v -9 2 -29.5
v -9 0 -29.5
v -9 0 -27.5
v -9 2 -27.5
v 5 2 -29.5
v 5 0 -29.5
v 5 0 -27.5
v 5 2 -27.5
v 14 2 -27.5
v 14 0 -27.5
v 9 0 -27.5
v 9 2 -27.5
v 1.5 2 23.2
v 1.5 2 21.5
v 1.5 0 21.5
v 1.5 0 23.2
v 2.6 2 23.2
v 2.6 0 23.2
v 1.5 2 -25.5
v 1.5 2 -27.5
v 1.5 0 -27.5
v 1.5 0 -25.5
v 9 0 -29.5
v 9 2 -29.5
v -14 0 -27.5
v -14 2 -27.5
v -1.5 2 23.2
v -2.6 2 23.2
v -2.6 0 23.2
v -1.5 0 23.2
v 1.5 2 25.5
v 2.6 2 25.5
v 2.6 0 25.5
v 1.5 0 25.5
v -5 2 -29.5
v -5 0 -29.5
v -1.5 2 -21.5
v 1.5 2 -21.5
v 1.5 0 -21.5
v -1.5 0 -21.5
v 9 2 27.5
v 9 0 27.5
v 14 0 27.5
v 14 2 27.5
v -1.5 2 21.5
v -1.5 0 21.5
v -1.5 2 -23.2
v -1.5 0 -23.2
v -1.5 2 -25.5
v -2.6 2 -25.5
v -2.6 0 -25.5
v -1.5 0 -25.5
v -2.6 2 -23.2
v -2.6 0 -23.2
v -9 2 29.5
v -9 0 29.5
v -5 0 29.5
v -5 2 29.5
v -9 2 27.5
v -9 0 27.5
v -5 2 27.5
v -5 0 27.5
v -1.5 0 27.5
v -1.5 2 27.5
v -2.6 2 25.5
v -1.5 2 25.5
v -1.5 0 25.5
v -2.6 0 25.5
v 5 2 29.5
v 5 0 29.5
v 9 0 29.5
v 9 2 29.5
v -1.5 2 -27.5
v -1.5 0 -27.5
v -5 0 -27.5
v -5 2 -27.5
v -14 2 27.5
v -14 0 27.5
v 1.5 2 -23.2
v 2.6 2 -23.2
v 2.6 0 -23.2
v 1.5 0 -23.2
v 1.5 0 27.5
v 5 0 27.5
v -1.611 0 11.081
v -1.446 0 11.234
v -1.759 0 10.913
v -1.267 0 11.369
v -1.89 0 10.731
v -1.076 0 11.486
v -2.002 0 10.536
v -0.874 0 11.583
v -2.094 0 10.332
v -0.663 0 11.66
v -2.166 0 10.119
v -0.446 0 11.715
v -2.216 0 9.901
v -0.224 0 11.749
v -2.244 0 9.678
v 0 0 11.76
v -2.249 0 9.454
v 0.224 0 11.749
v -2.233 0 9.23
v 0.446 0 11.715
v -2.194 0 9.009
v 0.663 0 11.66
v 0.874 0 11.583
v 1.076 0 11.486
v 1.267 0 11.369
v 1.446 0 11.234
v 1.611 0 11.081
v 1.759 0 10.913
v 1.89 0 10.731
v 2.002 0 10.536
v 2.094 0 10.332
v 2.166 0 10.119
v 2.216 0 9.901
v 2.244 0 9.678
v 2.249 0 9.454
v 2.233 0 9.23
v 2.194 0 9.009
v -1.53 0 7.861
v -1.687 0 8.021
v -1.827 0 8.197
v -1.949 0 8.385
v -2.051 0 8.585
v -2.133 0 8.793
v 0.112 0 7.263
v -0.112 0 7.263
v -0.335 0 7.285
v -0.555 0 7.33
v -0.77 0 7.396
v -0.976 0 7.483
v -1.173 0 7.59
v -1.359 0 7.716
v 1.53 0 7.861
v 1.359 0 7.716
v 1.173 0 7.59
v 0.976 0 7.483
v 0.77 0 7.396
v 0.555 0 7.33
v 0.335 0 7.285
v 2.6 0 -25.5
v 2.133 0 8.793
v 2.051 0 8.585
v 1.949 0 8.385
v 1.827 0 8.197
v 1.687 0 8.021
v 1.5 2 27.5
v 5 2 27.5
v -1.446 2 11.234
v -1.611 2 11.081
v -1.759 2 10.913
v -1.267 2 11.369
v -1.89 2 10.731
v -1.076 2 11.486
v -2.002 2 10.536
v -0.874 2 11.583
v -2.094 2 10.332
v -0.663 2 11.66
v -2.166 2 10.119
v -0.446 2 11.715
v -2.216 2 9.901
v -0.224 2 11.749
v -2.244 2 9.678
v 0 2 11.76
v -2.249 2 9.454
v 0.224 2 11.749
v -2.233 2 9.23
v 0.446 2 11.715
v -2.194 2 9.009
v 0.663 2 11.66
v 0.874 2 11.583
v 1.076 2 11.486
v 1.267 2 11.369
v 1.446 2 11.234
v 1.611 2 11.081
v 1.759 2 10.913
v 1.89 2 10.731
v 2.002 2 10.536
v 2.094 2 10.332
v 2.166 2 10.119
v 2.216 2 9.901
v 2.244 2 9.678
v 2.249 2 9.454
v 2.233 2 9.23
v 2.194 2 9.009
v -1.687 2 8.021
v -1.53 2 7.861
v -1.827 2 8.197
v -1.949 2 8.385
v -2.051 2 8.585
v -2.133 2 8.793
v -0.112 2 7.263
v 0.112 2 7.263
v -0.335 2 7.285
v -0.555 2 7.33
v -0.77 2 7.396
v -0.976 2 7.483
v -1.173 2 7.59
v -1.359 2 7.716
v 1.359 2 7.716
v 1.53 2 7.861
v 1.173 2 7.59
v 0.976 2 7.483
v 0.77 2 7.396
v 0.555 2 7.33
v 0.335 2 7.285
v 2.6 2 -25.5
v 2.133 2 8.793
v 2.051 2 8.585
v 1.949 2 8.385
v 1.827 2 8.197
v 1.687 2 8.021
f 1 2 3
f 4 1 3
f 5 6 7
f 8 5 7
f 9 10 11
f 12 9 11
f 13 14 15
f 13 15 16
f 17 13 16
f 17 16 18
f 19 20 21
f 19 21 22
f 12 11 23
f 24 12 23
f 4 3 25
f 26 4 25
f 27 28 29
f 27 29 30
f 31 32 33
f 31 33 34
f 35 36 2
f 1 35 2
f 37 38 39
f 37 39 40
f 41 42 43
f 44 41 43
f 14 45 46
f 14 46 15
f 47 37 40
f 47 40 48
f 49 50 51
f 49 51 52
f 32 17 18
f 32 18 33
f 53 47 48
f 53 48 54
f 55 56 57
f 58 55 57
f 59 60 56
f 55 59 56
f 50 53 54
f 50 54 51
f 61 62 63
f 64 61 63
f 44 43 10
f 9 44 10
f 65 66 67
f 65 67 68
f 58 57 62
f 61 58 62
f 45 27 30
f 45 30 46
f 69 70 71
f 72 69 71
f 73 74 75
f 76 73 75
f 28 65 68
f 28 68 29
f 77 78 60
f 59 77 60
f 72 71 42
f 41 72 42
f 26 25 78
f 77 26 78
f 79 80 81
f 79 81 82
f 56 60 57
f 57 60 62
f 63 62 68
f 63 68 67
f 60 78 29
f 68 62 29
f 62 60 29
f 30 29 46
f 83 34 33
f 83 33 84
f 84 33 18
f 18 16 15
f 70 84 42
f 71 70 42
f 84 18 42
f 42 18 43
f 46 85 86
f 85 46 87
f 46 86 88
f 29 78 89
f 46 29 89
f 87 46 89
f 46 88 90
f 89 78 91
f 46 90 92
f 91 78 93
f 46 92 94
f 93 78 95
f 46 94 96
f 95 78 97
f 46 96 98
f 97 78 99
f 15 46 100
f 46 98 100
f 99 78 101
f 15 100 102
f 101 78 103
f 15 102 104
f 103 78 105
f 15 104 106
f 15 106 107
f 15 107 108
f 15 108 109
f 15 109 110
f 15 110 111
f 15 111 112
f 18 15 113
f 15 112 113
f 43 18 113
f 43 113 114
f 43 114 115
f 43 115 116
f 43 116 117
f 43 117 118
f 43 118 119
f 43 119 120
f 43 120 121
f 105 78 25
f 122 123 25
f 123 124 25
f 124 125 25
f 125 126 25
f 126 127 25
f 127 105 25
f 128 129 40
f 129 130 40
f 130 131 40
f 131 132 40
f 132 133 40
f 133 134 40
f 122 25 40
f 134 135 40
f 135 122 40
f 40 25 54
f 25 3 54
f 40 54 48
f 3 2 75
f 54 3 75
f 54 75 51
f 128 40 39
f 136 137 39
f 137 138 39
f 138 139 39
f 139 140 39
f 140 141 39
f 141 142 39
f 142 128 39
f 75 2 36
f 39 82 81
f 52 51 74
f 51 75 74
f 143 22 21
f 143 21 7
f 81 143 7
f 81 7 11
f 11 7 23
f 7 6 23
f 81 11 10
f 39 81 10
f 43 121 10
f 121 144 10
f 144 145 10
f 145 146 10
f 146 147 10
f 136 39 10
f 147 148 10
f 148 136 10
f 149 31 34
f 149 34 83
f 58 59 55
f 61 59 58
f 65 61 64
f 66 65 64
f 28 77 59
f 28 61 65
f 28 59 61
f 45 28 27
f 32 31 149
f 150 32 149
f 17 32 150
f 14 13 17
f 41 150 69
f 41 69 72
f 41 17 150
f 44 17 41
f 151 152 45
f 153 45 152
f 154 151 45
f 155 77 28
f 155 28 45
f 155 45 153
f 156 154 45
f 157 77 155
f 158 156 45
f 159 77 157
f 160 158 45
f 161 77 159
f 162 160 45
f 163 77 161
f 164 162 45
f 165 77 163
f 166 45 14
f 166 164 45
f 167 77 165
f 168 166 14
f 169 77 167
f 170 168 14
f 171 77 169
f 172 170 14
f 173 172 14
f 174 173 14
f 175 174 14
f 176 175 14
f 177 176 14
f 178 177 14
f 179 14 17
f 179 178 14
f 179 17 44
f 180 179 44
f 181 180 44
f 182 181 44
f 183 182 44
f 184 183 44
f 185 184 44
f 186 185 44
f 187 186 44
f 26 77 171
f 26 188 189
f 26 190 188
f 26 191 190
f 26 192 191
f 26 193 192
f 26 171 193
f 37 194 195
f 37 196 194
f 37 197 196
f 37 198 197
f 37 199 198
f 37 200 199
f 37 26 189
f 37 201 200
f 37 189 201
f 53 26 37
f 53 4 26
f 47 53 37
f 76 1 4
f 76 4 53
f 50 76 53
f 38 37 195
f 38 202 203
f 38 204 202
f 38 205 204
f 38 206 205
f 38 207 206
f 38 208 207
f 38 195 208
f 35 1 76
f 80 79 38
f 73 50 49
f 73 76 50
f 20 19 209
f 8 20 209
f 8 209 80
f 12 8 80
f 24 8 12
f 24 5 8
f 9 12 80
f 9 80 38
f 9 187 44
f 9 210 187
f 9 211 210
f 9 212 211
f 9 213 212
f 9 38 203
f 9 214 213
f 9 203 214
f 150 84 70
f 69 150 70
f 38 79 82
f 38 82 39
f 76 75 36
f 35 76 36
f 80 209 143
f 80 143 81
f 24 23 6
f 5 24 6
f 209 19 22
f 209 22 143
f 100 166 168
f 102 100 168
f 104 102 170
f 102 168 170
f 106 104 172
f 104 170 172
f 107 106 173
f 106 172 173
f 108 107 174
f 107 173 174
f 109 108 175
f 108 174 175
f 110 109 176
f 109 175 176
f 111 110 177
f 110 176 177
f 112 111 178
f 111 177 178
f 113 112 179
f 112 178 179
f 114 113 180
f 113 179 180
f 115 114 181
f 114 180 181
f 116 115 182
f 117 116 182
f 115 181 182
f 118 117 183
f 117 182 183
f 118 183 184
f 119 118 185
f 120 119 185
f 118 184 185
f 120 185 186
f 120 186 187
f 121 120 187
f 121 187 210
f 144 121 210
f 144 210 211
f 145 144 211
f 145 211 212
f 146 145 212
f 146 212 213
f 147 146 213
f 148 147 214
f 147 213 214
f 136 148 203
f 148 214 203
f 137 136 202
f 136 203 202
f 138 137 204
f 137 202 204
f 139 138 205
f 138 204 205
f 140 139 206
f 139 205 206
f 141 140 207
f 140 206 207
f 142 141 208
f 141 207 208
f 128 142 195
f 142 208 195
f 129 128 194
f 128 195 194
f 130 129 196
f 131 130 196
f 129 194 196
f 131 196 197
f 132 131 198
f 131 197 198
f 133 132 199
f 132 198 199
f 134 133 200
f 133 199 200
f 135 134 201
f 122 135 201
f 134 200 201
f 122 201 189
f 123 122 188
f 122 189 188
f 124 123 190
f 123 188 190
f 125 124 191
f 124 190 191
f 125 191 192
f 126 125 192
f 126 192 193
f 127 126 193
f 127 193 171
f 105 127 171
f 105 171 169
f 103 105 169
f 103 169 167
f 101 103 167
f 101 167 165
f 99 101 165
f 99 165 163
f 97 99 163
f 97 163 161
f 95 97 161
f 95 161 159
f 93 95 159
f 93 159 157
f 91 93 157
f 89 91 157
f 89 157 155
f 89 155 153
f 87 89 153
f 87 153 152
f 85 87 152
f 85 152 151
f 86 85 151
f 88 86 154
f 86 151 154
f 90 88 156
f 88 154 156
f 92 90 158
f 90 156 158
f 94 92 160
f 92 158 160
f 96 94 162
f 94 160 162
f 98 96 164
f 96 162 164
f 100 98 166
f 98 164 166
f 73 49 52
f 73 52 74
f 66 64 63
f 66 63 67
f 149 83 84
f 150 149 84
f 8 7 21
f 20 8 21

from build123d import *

# Parameters (mm, degrees)
BOSS_EXTRUDE1_DEPTH = 2
CUT_EXTRUDE2_DEPTH  = 2
SKETCH5_R           = 2.25
CUT_EXTRUDE4_DEPTH  = 2


with BuildPart() as part:
    # Sketch1 → Boss-Extrude1 (new body)
    with BuildSketch(Plane(origin=(0, 0, 0), x_dir=(1, 0, 0), z_dir=(0, 1, 0))):
        Polygon((-14, -27.5), (-9, -27.5), (-9, -29.5), (-5, -29.5), (-5, -27.5), (5, -27.5), (5, -29.5), (9, -29.5), (9, -27.5), (14, -27.5), (14, 27.5), (9, 27.5), (9, 29.5), (5, 29.5), (5, 27.5), (-5, 27.5), (-5, 29.5), (-9, 29.5), (-9, 27.5), (-14, 27.5), (-14, 14.5), (-14, -14.5), align=None)
    extrude(amount=BOSS_EXTRUDE1_DEPTH)

    # Sketch4 → Cut-Extrude2 (cut)
    with BuildSketch(Plane(origin=(0, 2, 0), x_dir=(1, 0, 0), z_dir=(0, 1, 0))):
        Polygon((-1.5, 23.2), (-2.6, 23.2), (-2.6, 25.5), (-1.5, 25.5), (-1.5, 27.5), (1.5, 27.5), (1.5, 25.5), (2.6, 25.5), (2.6, 23.2), (1.5, 23.2), (1.5, 21.5), (-1.5, 21.5), align=None)
        Polygon((1.5, -25.5), (1.5, -27.5), (-1.5, -27.5), (-1.5, -25.5), (-2.6, -25.5), (-2.6, -23.2), (-1.5, -23.2), (-1.5, -21.5), (1.5, -21.5), (1.5, -23.2), (2.6, -23.2), (2.6, -25.5), align=None)
    extrude(amount=-CUT_EXTRUDE2_DEPTH, mode=Mode.SUBTRACT)

    # Sketch5 → Cut-Extrude4 (cut)
    with BuildSketch(Plane(origin=(0, 2, 0), x_dir=(1, 0, 0), z_dir=(0, 1, 0))):
        with Locations(Location((0, -9.51, 0), (0, 0, 270))):
            Circle(SKETCH5_R)
    extrude(amount=-CUT_EXTRUDE4_DEPTH, mode=Mode.SUBTRACT)


solid = part.part
